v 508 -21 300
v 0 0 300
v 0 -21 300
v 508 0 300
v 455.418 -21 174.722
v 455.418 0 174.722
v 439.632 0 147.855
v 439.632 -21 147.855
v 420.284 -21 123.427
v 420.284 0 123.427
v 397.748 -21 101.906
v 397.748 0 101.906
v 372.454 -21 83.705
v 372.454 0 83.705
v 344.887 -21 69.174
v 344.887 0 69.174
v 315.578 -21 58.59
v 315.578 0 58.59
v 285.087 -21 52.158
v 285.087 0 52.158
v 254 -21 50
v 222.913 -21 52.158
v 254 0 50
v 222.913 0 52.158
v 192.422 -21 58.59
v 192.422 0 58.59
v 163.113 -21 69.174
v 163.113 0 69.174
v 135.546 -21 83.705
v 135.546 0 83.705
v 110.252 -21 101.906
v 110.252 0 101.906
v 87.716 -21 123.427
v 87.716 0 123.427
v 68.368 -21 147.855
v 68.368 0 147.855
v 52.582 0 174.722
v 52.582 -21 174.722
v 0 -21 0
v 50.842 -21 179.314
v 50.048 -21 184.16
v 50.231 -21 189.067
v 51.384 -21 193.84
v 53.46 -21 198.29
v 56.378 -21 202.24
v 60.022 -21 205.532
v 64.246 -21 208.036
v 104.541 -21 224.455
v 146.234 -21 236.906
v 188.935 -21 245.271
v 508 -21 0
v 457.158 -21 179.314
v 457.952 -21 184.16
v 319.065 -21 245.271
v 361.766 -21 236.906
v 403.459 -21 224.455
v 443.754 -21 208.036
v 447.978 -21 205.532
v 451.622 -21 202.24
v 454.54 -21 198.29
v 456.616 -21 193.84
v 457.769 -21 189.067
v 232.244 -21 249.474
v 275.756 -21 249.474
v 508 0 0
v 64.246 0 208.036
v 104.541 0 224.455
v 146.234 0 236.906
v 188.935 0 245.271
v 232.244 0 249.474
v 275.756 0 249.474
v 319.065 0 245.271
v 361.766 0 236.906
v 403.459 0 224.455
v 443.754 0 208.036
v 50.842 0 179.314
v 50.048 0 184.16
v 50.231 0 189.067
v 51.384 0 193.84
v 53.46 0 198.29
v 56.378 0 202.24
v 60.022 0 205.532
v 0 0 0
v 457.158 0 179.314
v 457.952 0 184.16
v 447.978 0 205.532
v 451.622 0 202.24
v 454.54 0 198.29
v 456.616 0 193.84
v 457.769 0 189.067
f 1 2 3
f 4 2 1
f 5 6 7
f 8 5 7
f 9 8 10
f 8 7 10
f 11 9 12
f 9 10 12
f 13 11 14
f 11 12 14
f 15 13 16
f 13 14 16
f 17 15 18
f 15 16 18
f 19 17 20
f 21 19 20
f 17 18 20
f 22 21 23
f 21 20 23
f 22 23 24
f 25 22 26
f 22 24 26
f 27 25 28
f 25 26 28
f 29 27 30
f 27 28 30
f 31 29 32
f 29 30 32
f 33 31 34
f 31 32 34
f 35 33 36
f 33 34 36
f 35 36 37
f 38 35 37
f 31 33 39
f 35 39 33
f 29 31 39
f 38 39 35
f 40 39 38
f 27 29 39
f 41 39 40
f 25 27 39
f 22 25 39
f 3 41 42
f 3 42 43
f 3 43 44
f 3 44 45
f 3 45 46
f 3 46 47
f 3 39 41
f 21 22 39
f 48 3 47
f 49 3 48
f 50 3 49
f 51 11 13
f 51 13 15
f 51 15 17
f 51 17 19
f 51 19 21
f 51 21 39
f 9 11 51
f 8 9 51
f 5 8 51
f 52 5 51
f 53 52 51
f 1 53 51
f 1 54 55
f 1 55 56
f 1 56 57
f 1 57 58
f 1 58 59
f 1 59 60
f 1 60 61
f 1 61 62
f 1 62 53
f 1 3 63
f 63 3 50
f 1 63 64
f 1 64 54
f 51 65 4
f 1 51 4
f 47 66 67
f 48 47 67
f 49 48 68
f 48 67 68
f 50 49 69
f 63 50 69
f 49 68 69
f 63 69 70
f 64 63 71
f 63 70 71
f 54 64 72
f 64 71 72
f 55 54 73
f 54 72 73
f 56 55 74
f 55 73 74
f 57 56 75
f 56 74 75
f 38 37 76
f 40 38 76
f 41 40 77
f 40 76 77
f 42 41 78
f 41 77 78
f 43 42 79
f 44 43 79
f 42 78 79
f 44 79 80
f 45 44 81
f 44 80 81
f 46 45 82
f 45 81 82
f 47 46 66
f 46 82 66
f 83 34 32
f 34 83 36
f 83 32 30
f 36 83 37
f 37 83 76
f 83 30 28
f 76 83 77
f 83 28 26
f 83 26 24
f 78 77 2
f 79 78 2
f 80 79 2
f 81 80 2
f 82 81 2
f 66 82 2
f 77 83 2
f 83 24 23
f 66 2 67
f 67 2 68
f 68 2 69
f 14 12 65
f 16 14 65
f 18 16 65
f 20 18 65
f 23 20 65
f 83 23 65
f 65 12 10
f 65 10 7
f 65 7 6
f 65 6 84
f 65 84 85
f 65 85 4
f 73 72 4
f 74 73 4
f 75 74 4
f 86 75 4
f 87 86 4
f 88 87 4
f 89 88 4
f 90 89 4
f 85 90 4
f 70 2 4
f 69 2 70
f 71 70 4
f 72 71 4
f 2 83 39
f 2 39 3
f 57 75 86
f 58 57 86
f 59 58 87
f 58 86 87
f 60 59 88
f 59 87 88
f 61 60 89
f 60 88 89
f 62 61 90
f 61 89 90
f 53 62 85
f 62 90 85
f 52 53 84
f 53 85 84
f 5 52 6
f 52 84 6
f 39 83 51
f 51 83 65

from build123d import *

# Parameters (mm, degrees)
F0_W     = 508
F0_H     = 300
F1_DEPTH = 21


with BuildPart() as f1:
    # F0 (on Front) → F1 (new body)
    with BuildSketch(Plane.XZ):
        with Locations((254, 150)):
            Rectangle(F0_W, F0_H)
        with BuildLine():
            ThreePointArc((64.245627, 208.035878), (254, 250), (443.754373, 208.035878))
            ThreePointArc((443.754373, 208.035878), (456.616189, 193.840292), (455.418317, 174.722078))
            ThreePointArc((455.418317, 174.722078), (254, 50), (52.581683, 174.722078))
            ThreePointArc((52.581683, 174.722078), (51.383811, 193.840292), (64.245627, 208.035878))
        make_face(mode=Mode.SUBTRACT)
    extrude(amount=F1_DEPTH)


solid = f1.part
